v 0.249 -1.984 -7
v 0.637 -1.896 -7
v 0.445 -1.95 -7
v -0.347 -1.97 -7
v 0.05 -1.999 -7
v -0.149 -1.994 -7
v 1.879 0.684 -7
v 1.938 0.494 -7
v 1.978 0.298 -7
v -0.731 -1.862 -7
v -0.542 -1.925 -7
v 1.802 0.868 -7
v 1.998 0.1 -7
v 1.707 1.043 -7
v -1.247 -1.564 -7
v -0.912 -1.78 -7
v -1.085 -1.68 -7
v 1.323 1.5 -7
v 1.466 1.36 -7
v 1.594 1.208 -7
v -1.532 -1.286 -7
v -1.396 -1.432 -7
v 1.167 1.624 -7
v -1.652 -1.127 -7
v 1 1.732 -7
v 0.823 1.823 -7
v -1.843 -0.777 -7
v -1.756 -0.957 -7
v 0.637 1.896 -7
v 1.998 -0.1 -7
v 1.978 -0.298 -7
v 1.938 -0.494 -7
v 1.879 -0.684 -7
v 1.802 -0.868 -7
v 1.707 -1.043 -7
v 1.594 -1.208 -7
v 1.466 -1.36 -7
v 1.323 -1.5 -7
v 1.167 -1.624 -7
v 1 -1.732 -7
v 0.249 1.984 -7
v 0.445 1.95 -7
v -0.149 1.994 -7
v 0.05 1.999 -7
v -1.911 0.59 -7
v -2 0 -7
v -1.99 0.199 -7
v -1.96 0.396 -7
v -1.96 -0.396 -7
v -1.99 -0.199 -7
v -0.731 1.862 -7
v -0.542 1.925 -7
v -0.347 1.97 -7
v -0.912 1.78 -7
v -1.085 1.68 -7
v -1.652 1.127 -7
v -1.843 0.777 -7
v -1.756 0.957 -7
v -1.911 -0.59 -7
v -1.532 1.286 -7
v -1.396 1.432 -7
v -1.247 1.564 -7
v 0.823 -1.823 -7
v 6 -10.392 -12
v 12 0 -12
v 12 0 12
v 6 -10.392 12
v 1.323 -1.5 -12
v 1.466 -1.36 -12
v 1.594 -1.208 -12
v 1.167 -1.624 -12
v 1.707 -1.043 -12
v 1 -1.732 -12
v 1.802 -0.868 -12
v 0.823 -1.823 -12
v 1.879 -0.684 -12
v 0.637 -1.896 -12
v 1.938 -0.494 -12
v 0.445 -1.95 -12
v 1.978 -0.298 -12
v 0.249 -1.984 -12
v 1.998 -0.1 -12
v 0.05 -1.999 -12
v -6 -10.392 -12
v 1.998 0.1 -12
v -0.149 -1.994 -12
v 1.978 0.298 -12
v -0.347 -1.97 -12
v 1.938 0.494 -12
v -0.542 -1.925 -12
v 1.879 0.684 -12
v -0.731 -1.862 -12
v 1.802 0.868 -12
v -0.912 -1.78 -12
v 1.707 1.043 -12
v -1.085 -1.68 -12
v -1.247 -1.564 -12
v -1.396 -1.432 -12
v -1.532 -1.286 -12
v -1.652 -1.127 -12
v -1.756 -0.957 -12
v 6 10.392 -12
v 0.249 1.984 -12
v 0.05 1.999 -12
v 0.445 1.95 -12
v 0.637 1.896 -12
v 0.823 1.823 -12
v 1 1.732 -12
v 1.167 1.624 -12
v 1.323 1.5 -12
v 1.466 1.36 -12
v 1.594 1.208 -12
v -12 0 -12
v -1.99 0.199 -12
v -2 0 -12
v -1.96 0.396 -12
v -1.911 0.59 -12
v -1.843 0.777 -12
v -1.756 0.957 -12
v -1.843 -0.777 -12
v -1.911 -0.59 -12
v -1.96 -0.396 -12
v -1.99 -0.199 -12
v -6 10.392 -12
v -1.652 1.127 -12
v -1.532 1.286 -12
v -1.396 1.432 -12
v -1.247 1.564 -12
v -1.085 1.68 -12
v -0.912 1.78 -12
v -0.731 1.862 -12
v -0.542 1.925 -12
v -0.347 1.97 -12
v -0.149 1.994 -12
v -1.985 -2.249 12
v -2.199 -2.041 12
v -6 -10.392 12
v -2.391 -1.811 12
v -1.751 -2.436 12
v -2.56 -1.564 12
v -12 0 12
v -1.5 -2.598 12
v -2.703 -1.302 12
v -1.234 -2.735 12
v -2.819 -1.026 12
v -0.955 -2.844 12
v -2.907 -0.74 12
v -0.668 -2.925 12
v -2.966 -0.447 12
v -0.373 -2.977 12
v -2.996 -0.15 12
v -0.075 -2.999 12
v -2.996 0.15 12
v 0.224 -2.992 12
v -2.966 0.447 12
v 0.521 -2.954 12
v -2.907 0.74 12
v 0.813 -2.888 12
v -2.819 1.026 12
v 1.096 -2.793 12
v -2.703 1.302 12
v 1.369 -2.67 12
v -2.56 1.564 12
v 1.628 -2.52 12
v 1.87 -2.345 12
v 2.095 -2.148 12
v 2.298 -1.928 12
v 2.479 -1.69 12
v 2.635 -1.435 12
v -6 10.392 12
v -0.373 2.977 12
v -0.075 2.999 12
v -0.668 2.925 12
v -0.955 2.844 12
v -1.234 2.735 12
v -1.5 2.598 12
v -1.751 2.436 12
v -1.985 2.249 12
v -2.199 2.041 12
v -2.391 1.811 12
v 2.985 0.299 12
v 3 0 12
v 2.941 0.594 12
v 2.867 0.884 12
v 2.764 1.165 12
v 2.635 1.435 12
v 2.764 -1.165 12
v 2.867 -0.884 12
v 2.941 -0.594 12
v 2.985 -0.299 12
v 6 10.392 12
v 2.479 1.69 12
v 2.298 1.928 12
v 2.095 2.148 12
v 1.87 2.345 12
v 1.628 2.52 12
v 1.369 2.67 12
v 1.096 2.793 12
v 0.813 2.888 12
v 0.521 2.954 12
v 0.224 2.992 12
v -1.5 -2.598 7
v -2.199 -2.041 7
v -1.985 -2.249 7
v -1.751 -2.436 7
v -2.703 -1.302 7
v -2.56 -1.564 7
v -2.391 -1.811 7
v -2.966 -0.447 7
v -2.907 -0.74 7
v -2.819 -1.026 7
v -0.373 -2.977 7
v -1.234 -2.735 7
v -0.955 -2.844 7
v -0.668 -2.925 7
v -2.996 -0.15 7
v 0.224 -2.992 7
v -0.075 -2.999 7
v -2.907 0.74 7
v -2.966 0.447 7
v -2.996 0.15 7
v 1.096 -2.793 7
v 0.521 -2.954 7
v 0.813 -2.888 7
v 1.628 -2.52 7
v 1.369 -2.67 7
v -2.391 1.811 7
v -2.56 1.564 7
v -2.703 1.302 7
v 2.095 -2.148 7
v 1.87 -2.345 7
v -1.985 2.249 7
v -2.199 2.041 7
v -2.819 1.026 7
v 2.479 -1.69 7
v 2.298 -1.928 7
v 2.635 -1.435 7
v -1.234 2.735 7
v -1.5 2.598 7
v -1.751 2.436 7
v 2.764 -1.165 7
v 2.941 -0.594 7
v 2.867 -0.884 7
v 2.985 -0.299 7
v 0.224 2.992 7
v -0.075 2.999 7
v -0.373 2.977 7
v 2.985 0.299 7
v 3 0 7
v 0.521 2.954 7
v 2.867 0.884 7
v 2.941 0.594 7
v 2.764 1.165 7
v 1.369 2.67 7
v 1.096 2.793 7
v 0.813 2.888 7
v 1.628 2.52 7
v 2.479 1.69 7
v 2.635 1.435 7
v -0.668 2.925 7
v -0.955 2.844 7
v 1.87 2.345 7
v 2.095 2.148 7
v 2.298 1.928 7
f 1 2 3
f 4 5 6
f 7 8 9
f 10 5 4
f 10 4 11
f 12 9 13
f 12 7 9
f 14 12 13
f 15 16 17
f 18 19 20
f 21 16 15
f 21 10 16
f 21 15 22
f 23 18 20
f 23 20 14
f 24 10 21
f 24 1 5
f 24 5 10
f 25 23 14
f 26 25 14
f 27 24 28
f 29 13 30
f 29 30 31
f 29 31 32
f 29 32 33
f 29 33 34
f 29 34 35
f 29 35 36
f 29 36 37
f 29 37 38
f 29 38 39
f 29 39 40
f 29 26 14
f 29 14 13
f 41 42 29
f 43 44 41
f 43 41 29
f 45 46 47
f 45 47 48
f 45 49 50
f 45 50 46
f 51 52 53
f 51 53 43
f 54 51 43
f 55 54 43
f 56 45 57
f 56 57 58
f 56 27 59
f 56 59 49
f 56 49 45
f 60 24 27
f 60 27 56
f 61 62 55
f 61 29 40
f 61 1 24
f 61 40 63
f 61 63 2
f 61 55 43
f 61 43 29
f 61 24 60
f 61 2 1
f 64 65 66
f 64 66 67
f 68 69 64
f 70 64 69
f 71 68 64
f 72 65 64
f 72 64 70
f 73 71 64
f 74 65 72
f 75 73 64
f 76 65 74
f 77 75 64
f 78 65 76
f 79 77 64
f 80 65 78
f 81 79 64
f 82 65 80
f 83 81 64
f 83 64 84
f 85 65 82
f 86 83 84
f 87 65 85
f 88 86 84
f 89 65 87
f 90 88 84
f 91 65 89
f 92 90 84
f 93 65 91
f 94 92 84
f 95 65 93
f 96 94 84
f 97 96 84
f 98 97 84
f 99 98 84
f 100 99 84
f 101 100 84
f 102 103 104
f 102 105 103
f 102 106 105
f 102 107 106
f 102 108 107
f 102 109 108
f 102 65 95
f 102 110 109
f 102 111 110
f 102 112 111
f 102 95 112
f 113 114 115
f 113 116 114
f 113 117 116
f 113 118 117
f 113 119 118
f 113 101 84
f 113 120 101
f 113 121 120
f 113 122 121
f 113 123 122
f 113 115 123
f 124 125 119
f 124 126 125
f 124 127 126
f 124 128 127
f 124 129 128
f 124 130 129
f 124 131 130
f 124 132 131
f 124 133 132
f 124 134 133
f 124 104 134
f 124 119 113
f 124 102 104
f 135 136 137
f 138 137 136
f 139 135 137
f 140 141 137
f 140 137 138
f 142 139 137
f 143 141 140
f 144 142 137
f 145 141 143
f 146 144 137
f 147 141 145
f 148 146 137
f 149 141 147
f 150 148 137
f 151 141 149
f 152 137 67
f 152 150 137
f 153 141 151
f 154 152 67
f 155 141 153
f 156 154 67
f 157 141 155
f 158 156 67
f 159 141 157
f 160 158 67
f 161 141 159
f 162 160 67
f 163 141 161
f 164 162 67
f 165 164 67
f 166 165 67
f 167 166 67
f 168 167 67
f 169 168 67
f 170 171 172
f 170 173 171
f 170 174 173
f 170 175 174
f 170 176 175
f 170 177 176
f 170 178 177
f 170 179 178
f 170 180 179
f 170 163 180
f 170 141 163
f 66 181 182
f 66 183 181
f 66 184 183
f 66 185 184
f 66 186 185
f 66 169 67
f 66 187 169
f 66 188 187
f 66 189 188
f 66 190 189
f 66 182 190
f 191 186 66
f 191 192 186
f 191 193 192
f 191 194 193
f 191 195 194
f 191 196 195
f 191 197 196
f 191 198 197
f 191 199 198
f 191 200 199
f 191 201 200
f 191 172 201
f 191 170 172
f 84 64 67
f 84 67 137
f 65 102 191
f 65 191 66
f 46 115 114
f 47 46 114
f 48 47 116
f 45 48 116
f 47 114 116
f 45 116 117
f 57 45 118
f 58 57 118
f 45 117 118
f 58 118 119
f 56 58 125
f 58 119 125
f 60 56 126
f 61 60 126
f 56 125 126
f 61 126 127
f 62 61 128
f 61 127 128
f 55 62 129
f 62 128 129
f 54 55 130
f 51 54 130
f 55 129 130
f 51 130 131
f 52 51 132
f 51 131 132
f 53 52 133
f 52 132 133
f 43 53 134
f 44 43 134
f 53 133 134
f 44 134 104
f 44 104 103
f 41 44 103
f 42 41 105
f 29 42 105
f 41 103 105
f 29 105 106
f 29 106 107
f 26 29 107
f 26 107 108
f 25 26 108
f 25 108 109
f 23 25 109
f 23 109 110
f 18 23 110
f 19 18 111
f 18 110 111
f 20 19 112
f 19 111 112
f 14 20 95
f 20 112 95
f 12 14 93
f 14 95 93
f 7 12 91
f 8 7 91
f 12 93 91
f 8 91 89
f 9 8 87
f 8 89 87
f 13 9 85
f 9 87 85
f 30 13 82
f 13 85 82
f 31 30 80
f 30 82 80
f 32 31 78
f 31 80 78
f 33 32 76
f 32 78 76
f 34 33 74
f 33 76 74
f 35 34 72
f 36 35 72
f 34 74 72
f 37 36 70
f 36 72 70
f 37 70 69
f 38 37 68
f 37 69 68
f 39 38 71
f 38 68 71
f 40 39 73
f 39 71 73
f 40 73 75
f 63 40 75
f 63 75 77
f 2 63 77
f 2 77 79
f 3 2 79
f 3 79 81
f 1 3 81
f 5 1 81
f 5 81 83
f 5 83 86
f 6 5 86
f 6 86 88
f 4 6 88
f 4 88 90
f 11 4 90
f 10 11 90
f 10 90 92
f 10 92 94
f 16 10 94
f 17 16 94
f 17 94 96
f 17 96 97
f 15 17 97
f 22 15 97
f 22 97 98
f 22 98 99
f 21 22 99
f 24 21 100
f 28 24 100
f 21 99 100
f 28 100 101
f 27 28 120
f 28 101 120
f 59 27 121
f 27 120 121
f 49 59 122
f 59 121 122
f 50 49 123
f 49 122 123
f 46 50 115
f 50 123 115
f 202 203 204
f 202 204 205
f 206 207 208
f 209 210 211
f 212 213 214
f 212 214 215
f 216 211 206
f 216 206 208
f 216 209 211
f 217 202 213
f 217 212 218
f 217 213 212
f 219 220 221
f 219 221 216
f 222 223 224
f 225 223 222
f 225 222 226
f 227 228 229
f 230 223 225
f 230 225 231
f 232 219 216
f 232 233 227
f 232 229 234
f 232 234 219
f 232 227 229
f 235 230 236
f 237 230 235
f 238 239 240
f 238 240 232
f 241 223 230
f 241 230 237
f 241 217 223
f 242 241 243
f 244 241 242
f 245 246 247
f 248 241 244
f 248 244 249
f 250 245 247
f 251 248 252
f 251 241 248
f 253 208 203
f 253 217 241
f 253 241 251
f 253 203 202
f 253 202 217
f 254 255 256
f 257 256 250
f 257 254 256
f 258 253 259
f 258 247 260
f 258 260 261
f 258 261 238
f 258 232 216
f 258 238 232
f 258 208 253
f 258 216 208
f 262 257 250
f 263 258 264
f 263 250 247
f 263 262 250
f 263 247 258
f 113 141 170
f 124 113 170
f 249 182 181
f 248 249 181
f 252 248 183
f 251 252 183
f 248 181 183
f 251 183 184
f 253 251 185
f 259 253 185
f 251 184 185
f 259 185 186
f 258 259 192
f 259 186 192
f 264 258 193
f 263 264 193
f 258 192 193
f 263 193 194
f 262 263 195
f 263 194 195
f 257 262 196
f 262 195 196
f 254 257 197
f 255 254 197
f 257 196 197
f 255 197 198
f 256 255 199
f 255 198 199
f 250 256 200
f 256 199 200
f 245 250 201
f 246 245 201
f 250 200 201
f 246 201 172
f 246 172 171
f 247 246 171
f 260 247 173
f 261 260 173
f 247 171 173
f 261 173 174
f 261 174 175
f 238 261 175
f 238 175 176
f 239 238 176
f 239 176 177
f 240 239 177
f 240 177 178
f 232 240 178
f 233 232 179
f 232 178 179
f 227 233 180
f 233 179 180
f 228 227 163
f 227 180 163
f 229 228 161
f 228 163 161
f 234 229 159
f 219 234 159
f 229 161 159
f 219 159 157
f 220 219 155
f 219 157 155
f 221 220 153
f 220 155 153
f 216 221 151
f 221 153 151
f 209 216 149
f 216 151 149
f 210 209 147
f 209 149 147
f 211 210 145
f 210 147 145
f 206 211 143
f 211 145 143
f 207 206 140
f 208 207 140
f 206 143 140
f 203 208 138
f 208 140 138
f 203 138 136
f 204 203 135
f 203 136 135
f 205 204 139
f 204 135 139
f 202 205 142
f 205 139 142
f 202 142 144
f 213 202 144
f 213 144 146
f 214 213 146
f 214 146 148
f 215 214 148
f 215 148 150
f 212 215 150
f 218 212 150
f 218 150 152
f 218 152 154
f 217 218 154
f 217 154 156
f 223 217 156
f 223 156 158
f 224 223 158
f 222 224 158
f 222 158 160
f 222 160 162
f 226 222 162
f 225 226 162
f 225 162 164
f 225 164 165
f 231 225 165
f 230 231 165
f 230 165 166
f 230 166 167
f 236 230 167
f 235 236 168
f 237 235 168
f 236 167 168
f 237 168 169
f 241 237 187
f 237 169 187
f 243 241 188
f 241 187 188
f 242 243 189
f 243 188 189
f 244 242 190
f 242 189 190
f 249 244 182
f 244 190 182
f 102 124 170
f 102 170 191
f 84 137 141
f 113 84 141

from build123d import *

# Parameters (mm, degrees)
BOSS_EXTRUDE1_DEPTH = 12
SKETCH3_R           = 3
CUT_EXTRUDE1_DEPTH  = 5
BOSS_EXTRUDE2_DEPTH = 12
SKETCH5_R           = 2
CUT_EXTRUDE2_DEPTH  = 5


with BuildPart() as part:
    # Sketch1 → Boss-Extrude1 (new body)
    with BuildSketch(Plane.XY):
        Polygon((12, 0), (6, 10.392304845), (-6, 10.392304845), (-12, 0), (-6, -10.392304845), (6, -10.392304845), align=None)
    extrude(amount=BOSS_EXTRUDE1_DEPTH)

    # Sketch3 → Cut-Extrude1 (cut)
    with BuildSketch(Plane.XY.offset(12)):
        Circle(SKETCH3_R)
    extrude(amount=-CUT_EXTRUDE1_DEPTH, mode=Mode.SUBTRACT)

    # Sketch4 → Boss-Extrude2 (add)
    with BuildSketch(Plane(origin=(0, 0, 0), x_dir=(-1, 0, 0), z_dir=(0, 0, -1))):
        Polygon((12, 0), (6, 10.392304845), (-6, 10.392304845), (-12, 0), (-6, -10.392304845), (6, -10.392304845), align=None)
    extrude(amount=BOSS_EXTRUDE2_DEPTH)

    # Sketch5 → Cut-Extrude2 (cut)
    with BuildSketch(Plane(origin=(0, 0, -12), x_dir=(-1, 0, 0), z_dir=(0, 0, -1))):
        Circle(SKETCH5_R)
    extrude(amount=-CUT_EXTRUDE2_DEPTH, mode=Mode.SUBTRACT)


solid = part.part
